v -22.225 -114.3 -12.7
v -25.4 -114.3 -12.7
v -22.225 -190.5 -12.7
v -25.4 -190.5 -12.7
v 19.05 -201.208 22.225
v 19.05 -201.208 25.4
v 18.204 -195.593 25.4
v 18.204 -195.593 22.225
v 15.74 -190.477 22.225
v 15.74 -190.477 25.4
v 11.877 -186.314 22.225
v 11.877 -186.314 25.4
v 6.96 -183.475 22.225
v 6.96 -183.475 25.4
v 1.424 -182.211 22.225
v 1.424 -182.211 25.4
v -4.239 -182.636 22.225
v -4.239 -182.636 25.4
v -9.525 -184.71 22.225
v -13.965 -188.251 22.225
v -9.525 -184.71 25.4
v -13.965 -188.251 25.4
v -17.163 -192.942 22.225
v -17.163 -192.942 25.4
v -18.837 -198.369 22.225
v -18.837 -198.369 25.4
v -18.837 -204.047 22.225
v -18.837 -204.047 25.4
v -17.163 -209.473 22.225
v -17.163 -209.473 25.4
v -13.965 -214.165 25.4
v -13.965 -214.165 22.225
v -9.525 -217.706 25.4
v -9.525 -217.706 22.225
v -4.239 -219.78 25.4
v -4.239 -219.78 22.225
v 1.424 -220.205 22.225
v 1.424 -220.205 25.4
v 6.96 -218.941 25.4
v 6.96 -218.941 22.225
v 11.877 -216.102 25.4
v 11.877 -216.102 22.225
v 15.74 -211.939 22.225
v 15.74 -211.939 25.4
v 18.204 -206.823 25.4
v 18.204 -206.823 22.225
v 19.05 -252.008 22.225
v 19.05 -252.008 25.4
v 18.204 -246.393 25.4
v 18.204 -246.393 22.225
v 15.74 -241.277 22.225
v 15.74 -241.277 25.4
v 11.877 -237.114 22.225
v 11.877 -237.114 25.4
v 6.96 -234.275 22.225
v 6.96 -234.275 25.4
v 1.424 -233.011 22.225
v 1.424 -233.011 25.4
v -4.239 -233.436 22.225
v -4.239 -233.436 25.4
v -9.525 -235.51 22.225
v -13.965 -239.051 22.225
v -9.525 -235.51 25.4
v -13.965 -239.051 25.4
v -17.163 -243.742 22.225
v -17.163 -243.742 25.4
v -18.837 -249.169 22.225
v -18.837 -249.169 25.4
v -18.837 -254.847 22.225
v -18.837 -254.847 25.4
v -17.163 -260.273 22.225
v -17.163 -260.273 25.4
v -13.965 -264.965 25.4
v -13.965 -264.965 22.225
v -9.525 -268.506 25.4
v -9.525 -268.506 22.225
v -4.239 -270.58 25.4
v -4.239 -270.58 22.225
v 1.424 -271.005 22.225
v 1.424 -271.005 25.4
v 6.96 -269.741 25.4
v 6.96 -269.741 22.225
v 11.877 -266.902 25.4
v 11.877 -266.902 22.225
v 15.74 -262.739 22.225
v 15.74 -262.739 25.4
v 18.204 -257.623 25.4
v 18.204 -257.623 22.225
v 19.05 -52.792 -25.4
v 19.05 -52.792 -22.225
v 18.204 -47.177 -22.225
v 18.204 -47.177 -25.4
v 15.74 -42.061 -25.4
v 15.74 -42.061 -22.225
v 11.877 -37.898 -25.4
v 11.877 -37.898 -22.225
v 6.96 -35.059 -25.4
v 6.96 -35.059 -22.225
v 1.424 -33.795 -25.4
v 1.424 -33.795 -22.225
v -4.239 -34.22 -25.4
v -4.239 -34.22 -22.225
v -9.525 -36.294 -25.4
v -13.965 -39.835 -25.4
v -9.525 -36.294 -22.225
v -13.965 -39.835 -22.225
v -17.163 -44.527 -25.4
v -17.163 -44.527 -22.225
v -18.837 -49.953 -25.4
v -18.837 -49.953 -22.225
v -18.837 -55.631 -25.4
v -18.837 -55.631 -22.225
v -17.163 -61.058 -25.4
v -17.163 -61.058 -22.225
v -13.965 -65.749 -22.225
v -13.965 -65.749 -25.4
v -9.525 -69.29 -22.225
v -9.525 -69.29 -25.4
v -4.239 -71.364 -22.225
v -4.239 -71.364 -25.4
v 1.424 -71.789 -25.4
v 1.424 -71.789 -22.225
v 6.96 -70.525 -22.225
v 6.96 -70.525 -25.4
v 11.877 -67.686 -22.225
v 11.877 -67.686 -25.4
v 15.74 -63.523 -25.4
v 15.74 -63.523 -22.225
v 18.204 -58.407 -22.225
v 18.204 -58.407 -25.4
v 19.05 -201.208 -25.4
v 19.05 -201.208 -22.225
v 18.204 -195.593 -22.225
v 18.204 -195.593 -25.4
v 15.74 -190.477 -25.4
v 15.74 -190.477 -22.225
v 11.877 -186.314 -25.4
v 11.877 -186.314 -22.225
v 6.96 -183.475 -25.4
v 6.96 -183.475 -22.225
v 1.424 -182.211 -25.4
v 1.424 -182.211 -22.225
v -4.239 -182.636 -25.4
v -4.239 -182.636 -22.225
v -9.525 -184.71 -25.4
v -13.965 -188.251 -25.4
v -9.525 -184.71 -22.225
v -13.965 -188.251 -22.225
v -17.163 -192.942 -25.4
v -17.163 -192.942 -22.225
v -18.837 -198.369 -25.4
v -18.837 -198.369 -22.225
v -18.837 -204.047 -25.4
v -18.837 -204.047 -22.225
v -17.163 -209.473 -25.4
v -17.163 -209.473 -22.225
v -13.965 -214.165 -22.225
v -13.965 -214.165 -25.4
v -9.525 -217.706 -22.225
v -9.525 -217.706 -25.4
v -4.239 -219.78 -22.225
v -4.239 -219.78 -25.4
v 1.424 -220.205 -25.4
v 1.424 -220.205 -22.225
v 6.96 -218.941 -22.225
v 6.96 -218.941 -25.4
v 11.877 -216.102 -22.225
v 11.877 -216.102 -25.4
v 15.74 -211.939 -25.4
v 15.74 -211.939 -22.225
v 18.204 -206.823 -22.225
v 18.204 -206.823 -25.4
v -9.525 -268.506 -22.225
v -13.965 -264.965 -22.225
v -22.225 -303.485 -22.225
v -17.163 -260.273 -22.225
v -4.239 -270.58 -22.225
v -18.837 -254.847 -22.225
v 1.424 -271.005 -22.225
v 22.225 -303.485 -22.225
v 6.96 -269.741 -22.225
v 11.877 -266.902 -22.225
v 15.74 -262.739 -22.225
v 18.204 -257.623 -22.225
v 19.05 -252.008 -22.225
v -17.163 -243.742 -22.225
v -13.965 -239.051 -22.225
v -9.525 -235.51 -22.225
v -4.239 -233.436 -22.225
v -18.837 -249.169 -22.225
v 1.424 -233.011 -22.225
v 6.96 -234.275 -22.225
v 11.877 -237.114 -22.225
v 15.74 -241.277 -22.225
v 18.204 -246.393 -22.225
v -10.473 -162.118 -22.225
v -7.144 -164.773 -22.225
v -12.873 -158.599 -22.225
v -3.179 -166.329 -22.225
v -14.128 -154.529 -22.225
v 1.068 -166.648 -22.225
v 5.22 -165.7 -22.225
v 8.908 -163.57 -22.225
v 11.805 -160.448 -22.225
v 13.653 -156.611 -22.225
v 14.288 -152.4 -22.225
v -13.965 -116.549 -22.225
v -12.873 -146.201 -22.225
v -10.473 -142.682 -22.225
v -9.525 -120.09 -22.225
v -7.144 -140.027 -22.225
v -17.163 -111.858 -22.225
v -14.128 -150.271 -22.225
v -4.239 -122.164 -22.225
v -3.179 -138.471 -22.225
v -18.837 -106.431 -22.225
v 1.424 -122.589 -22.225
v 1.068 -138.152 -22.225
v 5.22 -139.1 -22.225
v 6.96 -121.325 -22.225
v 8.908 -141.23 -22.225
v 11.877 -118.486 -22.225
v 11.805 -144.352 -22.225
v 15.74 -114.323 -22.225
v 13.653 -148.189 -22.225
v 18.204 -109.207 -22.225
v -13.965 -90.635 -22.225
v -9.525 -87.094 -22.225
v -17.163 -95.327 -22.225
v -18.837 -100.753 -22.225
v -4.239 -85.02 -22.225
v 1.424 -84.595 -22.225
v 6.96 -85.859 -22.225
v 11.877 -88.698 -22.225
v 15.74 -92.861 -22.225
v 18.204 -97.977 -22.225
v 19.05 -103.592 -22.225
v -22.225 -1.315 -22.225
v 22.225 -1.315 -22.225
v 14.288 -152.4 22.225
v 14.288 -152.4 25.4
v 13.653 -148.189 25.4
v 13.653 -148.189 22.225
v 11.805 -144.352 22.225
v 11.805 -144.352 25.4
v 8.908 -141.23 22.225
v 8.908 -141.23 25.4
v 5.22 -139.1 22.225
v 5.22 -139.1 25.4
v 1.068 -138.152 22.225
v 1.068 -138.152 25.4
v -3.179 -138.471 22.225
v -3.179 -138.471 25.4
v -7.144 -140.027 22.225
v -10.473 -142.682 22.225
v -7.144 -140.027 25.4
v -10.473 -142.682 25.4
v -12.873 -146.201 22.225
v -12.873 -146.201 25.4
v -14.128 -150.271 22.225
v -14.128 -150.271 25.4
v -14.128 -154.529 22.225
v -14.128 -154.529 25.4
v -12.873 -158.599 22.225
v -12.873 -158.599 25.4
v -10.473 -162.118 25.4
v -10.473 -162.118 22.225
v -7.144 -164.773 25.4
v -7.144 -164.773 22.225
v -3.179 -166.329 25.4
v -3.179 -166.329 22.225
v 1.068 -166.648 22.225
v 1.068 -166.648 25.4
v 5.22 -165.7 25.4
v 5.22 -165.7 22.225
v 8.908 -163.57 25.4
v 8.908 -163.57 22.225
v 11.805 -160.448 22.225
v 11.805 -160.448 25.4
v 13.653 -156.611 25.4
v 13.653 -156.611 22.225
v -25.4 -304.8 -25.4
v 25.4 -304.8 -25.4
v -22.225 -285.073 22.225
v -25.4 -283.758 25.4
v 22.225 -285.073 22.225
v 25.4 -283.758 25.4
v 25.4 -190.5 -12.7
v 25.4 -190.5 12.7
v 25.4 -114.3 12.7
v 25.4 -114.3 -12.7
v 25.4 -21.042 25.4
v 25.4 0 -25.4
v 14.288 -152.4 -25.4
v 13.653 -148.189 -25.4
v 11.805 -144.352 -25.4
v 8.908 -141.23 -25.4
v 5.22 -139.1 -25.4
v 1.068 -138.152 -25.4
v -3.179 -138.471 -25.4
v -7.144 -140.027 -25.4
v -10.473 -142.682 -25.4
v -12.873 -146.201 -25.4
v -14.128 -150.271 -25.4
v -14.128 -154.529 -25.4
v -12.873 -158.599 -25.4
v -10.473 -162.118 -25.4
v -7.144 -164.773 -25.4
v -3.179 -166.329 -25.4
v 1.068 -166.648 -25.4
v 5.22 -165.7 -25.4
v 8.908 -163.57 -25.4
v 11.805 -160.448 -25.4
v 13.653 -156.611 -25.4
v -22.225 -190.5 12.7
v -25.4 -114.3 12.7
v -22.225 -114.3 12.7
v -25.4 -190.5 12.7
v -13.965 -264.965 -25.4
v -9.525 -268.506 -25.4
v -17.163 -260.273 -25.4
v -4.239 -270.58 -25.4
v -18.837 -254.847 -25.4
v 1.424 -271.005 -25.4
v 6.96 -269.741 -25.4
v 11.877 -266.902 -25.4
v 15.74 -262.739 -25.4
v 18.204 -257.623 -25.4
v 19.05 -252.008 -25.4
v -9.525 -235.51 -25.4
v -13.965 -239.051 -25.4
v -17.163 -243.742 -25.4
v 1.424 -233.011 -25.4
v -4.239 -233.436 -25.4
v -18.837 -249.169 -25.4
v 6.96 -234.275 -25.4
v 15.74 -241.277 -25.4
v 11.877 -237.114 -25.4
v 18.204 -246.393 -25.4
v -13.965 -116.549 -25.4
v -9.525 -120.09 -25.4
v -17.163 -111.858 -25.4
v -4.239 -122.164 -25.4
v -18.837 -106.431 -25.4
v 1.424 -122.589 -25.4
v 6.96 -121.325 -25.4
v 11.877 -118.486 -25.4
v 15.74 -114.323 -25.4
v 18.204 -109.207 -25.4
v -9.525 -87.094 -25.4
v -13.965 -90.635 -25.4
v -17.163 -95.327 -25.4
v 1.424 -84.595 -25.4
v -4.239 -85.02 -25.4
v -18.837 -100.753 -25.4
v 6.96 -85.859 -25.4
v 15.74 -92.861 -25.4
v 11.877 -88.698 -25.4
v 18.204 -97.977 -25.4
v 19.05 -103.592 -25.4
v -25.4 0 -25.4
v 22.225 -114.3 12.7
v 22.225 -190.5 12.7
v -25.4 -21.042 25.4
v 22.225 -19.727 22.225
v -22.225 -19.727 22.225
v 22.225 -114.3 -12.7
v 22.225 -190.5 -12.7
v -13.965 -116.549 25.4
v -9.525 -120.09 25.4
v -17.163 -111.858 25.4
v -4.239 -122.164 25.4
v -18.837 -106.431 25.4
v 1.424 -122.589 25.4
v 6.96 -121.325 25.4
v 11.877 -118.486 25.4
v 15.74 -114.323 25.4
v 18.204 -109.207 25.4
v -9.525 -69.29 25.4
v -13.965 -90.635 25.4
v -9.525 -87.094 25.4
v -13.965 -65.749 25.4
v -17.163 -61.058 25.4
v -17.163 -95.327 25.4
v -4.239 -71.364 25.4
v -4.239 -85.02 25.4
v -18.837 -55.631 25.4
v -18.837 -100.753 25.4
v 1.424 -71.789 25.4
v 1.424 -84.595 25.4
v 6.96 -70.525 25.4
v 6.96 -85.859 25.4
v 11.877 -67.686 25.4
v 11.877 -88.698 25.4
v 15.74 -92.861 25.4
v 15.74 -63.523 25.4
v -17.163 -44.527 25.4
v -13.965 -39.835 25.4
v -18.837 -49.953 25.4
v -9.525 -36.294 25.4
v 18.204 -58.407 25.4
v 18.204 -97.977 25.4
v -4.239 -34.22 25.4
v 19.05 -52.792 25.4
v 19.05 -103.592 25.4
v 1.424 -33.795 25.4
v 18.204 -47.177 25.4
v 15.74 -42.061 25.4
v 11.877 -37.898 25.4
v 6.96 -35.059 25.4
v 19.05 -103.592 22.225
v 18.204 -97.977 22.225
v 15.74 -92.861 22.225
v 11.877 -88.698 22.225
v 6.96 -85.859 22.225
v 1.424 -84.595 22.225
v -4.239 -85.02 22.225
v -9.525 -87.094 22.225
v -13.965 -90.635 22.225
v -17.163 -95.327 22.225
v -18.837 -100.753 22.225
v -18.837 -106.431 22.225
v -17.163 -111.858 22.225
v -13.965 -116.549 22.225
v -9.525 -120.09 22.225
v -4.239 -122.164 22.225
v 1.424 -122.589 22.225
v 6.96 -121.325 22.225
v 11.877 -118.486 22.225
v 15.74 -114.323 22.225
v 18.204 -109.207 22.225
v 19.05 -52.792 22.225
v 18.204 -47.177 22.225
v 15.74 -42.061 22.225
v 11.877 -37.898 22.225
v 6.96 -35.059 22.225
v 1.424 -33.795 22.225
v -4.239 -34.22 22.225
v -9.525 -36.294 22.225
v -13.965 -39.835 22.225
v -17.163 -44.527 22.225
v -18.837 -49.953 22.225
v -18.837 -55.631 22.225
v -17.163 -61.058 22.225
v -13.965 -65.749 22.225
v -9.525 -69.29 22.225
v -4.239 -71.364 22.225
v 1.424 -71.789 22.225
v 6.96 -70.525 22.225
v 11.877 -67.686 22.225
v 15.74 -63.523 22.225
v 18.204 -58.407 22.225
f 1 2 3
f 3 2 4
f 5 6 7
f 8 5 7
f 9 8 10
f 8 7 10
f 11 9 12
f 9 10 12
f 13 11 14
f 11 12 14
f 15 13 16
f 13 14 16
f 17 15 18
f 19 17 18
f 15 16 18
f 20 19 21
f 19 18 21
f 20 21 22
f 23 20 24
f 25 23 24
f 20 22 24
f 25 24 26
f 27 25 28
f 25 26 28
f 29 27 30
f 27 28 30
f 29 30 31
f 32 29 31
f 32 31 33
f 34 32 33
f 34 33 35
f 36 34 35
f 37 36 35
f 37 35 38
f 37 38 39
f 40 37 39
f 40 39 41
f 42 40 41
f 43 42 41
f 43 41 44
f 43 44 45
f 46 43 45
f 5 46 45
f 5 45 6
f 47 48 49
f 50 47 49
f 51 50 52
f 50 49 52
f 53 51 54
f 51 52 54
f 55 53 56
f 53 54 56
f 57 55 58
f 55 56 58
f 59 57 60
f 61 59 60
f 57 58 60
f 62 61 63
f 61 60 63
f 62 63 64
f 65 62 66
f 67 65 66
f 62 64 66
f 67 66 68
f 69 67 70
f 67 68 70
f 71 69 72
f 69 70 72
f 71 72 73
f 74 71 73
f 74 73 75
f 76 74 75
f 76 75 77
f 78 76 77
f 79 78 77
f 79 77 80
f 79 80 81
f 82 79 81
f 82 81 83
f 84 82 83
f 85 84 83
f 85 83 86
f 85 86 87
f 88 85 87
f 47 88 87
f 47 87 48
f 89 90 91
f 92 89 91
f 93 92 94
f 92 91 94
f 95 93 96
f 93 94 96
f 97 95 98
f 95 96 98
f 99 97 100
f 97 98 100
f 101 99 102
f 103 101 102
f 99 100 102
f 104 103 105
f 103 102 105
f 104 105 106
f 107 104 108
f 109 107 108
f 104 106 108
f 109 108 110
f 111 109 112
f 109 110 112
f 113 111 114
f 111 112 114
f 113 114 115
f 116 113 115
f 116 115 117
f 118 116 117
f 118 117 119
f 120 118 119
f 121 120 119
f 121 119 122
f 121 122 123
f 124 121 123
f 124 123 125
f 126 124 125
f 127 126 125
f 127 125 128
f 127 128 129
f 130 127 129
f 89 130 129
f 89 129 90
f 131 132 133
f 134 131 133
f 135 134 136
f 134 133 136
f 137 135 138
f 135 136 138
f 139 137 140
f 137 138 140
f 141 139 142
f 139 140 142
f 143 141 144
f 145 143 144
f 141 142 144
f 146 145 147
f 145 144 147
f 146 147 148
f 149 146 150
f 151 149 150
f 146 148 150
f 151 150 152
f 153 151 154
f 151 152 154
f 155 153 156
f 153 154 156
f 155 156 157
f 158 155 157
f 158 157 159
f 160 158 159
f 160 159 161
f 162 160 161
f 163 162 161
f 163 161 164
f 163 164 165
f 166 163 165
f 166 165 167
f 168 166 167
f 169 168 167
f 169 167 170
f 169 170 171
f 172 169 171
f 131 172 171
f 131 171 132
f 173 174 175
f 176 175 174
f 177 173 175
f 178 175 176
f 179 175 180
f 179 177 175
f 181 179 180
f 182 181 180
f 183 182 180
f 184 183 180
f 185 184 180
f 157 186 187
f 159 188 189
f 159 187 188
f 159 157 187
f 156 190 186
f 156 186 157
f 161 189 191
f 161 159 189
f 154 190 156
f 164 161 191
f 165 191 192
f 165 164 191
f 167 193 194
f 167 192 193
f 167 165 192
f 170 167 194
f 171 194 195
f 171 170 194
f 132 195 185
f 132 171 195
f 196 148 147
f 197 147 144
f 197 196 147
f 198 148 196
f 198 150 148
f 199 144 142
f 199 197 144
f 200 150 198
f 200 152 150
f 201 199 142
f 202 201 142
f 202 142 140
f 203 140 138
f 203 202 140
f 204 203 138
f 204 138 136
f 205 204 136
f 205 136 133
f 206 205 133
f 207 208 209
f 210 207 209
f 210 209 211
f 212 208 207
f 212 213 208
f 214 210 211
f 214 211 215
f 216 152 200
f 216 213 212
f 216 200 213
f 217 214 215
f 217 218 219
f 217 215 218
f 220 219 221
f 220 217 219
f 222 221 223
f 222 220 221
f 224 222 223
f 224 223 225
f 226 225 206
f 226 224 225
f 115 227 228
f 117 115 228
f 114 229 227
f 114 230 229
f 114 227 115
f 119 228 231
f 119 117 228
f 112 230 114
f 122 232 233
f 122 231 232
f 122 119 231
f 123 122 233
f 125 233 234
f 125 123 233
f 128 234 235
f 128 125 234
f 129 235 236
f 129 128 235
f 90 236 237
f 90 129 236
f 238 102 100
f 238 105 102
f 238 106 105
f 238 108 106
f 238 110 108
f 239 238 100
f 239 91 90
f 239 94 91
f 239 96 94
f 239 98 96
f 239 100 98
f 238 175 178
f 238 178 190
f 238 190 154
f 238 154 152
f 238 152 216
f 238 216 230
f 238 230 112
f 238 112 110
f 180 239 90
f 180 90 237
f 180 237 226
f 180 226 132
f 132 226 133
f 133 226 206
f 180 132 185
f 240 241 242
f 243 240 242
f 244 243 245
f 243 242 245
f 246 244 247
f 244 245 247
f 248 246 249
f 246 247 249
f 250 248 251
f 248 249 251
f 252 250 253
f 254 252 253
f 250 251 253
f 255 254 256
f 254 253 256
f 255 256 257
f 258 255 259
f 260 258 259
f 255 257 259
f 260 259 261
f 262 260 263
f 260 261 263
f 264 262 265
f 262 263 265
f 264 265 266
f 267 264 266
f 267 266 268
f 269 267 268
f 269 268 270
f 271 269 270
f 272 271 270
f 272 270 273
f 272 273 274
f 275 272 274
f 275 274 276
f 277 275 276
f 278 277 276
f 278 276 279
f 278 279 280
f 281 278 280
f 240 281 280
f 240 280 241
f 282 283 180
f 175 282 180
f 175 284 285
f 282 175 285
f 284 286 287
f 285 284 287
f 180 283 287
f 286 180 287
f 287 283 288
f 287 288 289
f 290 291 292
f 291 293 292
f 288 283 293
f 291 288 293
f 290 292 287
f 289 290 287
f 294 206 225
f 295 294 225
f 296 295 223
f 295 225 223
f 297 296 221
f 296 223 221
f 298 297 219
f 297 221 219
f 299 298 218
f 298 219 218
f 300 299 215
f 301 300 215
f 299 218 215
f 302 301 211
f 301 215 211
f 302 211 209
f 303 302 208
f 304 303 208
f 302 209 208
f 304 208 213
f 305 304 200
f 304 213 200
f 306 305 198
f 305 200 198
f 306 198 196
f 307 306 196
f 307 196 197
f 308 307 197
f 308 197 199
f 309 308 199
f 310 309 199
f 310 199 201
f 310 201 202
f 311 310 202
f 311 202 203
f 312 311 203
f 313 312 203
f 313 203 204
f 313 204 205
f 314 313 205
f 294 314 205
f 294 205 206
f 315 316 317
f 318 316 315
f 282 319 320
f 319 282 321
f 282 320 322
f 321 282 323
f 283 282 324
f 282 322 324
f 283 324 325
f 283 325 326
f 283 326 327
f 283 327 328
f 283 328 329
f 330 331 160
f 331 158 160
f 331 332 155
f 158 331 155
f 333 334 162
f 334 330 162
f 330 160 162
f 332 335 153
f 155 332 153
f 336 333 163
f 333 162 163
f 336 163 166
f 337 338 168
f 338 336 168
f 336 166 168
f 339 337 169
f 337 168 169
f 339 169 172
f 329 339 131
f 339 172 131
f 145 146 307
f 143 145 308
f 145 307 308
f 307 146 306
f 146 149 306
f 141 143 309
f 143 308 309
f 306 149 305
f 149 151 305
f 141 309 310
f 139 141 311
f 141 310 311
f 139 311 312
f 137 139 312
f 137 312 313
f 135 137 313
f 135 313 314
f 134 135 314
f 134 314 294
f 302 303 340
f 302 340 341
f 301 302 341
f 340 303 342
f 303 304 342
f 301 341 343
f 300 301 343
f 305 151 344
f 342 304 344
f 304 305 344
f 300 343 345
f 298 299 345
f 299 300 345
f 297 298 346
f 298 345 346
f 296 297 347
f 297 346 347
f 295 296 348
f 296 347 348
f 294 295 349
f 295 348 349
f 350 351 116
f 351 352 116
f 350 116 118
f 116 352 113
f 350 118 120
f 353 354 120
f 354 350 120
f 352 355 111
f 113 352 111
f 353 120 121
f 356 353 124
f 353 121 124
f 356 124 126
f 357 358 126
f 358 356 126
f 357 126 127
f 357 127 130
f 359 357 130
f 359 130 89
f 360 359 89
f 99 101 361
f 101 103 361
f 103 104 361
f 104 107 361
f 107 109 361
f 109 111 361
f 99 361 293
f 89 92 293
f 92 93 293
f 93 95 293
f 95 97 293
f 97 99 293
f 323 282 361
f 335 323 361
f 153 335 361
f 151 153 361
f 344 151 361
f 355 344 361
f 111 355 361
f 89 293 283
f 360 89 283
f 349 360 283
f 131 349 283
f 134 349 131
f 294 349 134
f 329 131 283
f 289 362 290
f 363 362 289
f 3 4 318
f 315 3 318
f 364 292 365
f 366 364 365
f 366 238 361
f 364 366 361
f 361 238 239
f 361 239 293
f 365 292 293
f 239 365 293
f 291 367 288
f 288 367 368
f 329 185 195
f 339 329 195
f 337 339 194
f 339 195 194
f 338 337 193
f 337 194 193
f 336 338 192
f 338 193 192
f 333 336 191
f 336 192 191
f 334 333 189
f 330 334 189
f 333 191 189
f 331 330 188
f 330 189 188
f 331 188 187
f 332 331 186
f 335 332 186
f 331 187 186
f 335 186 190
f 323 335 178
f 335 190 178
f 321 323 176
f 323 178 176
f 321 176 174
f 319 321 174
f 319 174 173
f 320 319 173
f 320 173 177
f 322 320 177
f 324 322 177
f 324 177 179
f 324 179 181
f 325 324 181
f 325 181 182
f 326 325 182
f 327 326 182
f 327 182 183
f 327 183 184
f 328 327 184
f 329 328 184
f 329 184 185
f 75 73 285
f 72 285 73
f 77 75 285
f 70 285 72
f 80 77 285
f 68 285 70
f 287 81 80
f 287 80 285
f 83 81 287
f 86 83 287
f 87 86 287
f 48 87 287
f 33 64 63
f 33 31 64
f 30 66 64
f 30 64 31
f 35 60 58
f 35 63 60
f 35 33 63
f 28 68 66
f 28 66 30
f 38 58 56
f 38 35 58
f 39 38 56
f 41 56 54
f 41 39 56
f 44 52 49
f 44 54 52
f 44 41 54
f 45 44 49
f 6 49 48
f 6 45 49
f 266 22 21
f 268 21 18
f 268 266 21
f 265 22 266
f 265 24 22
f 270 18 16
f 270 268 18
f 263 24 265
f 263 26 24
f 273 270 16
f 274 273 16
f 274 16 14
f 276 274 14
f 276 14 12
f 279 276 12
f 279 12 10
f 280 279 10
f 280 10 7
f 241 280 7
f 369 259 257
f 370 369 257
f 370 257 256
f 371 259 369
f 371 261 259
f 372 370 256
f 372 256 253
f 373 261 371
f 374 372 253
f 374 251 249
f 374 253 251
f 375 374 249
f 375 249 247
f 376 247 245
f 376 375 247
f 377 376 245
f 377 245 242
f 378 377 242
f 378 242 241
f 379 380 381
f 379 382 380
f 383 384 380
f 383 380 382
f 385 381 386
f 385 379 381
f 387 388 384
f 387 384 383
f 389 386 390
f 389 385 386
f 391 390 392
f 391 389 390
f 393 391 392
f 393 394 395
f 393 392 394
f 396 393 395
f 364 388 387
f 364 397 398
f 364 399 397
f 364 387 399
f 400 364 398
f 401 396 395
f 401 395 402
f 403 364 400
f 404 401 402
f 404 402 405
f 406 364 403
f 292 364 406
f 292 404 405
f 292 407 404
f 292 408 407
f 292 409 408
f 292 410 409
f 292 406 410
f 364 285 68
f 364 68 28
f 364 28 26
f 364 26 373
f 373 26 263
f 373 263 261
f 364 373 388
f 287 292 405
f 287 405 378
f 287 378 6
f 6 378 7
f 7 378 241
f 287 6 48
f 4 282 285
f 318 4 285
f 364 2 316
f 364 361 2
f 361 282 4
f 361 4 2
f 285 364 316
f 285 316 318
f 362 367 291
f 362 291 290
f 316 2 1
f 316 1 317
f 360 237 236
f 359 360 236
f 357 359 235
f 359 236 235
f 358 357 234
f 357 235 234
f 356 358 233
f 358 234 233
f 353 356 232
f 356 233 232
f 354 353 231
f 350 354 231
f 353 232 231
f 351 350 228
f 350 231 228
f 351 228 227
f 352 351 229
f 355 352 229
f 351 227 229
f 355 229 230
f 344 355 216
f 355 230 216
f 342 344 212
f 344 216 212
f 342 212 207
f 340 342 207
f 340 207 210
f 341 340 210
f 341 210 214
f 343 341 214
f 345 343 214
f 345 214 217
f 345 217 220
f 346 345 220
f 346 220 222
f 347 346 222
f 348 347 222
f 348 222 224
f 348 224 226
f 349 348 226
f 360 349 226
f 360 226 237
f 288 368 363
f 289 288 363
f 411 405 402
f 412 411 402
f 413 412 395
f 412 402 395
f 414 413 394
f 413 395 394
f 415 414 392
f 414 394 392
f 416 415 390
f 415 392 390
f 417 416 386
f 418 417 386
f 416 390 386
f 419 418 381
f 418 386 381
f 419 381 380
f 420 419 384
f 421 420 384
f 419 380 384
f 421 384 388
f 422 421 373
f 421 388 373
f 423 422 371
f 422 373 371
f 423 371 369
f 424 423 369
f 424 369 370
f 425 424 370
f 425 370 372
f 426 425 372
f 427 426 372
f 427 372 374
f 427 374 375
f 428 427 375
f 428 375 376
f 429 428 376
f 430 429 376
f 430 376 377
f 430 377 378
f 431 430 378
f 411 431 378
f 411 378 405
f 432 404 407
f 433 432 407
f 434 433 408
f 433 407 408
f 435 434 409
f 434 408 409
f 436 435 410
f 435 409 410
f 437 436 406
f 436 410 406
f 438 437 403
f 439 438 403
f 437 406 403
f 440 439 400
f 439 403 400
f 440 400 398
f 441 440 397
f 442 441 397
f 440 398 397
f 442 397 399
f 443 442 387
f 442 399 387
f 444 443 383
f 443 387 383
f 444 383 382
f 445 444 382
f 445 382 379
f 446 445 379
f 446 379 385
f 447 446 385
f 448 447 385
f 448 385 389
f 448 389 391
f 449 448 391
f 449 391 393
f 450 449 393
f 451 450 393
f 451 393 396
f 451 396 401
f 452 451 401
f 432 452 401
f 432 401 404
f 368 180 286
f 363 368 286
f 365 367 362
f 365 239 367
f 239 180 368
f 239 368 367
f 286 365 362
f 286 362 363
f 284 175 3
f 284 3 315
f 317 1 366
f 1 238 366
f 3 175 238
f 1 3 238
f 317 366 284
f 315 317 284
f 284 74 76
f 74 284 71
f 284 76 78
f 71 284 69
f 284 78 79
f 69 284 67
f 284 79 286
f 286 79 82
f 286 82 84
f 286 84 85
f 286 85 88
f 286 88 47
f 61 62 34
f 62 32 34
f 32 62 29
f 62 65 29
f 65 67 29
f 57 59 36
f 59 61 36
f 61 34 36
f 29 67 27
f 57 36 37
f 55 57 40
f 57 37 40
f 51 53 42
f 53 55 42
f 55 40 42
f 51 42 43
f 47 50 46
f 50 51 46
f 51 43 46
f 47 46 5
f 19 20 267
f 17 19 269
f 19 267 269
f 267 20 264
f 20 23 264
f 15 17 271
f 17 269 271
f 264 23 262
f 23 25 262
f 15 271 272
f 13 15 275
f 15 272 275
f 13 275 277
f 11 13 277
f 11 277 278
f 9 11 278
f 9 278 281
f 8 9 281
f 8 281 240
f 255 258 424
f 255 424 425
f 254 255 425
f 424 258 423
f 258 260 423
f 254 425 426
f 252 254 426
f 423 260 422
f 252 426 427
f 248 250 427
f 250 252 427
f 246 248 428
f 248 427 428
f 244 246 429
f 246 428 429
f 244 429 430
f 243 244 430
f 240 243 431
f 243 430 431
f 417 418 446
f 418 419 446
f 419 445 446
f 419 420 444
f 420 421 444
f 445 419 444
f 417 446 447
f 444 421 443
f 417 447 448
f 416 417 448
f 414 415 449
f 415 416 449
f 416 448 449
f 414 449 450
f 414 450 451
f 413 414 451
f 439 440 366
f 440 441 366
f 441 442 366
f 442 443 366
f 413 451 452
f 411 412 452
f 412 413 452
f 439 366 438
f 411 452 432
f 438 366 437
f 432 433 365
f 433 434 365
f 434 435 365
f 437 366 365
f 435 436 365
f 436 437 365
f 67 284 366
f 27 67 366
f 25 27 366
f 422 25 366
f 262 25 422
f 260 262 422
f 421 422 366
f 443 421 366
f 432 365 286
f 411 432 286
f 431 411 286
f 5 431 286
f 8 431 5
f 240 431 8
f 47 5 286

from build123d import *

# Parameters (mm, degrees)
F1_W      = 50.8
F1_H      = 50.8
F1_W_2    = 44.45
F1_H_2    = 44.45
F2_DEPTH  = 304.8
F4_DEPTH  = 50.801
F6_DEPTH  = 127
F7_R      = 14.2875
F8_DEPTH  = 50.801
F9_W      = 76.2
F9_H      = 25.4
F10_DEPTH = 50.801
F11_R     = 19.05
F12_DEPTH = 50.8


with BuildPart() as f2:
    # F1 (on face) → F2 (new body)
    with BuildSketch(Plane.XZ):
        Rectangle(F1_W, F1_H)
        Rectangle(F1_W_2, F1_H_2, mode=Mode.SUBTRACT)
    extrude(amount=F2_DEPTH)

    # F3 (on face) → F4 (cut, through all)
    with BuildSketch(Plane.YZ.offset(25.4)):
        Polygon((-283.757951, 25.4), (-304.8, 25.4), (-304.8, -25.4), align=None)
    extrude(amount=-F4_DEPTH, mode=Mode.SUBTRACT)

    # F5 (on face) → F6 (cut)
    with BuildSketch(Plane.YZ.offset(25.4)):
        Polygon((0, -25.4), (0, 25.4), (-21.042049, 25.4), align=None)
    extrude(amount=-F6_DEPTH, mode=Mode.SUBTRACT)

    # F7 (on face) → F8 (cut, through all)
    with BuildSketch(Plane.XY.offset(25.4)):
        with Locations((0, -152.4)):
            Circle(F7_R)
    extrude(amount=-F8_DEPTH, mode=Mode.SUBTRACT)

    # F9 (on face) → F10 (cut, through all)
    with BuildSketch(Plane(origin=(-25.4, 0, 0), x_dir=(0, -1, 0), z_dir=(-1, 0, 0))):
        with Locations((152.4, 0)):
            Rectangle(F9_W, F9_H)
    extrude(amount=-F10_DEPTH, mode=Mode.SUBTRACT)

    # F11 (on face) → F12 (cut)
    with BuildSketch(Plane.XY.offset(25.4)):
        with Locations((0, -252.007951)):
            Circle(F11_R)
        with Locations((0, -201.207951)):
            Circle(F11_R)
        with Locations((0, -103.592049)):
            Circle(F11_R)
        with Locations((0, -52.792049)):
            Circle(F11_R)
    extrude(amount=-F12_DEPTH, mode=Mode.SUBTRACT)


solid = f2.part
